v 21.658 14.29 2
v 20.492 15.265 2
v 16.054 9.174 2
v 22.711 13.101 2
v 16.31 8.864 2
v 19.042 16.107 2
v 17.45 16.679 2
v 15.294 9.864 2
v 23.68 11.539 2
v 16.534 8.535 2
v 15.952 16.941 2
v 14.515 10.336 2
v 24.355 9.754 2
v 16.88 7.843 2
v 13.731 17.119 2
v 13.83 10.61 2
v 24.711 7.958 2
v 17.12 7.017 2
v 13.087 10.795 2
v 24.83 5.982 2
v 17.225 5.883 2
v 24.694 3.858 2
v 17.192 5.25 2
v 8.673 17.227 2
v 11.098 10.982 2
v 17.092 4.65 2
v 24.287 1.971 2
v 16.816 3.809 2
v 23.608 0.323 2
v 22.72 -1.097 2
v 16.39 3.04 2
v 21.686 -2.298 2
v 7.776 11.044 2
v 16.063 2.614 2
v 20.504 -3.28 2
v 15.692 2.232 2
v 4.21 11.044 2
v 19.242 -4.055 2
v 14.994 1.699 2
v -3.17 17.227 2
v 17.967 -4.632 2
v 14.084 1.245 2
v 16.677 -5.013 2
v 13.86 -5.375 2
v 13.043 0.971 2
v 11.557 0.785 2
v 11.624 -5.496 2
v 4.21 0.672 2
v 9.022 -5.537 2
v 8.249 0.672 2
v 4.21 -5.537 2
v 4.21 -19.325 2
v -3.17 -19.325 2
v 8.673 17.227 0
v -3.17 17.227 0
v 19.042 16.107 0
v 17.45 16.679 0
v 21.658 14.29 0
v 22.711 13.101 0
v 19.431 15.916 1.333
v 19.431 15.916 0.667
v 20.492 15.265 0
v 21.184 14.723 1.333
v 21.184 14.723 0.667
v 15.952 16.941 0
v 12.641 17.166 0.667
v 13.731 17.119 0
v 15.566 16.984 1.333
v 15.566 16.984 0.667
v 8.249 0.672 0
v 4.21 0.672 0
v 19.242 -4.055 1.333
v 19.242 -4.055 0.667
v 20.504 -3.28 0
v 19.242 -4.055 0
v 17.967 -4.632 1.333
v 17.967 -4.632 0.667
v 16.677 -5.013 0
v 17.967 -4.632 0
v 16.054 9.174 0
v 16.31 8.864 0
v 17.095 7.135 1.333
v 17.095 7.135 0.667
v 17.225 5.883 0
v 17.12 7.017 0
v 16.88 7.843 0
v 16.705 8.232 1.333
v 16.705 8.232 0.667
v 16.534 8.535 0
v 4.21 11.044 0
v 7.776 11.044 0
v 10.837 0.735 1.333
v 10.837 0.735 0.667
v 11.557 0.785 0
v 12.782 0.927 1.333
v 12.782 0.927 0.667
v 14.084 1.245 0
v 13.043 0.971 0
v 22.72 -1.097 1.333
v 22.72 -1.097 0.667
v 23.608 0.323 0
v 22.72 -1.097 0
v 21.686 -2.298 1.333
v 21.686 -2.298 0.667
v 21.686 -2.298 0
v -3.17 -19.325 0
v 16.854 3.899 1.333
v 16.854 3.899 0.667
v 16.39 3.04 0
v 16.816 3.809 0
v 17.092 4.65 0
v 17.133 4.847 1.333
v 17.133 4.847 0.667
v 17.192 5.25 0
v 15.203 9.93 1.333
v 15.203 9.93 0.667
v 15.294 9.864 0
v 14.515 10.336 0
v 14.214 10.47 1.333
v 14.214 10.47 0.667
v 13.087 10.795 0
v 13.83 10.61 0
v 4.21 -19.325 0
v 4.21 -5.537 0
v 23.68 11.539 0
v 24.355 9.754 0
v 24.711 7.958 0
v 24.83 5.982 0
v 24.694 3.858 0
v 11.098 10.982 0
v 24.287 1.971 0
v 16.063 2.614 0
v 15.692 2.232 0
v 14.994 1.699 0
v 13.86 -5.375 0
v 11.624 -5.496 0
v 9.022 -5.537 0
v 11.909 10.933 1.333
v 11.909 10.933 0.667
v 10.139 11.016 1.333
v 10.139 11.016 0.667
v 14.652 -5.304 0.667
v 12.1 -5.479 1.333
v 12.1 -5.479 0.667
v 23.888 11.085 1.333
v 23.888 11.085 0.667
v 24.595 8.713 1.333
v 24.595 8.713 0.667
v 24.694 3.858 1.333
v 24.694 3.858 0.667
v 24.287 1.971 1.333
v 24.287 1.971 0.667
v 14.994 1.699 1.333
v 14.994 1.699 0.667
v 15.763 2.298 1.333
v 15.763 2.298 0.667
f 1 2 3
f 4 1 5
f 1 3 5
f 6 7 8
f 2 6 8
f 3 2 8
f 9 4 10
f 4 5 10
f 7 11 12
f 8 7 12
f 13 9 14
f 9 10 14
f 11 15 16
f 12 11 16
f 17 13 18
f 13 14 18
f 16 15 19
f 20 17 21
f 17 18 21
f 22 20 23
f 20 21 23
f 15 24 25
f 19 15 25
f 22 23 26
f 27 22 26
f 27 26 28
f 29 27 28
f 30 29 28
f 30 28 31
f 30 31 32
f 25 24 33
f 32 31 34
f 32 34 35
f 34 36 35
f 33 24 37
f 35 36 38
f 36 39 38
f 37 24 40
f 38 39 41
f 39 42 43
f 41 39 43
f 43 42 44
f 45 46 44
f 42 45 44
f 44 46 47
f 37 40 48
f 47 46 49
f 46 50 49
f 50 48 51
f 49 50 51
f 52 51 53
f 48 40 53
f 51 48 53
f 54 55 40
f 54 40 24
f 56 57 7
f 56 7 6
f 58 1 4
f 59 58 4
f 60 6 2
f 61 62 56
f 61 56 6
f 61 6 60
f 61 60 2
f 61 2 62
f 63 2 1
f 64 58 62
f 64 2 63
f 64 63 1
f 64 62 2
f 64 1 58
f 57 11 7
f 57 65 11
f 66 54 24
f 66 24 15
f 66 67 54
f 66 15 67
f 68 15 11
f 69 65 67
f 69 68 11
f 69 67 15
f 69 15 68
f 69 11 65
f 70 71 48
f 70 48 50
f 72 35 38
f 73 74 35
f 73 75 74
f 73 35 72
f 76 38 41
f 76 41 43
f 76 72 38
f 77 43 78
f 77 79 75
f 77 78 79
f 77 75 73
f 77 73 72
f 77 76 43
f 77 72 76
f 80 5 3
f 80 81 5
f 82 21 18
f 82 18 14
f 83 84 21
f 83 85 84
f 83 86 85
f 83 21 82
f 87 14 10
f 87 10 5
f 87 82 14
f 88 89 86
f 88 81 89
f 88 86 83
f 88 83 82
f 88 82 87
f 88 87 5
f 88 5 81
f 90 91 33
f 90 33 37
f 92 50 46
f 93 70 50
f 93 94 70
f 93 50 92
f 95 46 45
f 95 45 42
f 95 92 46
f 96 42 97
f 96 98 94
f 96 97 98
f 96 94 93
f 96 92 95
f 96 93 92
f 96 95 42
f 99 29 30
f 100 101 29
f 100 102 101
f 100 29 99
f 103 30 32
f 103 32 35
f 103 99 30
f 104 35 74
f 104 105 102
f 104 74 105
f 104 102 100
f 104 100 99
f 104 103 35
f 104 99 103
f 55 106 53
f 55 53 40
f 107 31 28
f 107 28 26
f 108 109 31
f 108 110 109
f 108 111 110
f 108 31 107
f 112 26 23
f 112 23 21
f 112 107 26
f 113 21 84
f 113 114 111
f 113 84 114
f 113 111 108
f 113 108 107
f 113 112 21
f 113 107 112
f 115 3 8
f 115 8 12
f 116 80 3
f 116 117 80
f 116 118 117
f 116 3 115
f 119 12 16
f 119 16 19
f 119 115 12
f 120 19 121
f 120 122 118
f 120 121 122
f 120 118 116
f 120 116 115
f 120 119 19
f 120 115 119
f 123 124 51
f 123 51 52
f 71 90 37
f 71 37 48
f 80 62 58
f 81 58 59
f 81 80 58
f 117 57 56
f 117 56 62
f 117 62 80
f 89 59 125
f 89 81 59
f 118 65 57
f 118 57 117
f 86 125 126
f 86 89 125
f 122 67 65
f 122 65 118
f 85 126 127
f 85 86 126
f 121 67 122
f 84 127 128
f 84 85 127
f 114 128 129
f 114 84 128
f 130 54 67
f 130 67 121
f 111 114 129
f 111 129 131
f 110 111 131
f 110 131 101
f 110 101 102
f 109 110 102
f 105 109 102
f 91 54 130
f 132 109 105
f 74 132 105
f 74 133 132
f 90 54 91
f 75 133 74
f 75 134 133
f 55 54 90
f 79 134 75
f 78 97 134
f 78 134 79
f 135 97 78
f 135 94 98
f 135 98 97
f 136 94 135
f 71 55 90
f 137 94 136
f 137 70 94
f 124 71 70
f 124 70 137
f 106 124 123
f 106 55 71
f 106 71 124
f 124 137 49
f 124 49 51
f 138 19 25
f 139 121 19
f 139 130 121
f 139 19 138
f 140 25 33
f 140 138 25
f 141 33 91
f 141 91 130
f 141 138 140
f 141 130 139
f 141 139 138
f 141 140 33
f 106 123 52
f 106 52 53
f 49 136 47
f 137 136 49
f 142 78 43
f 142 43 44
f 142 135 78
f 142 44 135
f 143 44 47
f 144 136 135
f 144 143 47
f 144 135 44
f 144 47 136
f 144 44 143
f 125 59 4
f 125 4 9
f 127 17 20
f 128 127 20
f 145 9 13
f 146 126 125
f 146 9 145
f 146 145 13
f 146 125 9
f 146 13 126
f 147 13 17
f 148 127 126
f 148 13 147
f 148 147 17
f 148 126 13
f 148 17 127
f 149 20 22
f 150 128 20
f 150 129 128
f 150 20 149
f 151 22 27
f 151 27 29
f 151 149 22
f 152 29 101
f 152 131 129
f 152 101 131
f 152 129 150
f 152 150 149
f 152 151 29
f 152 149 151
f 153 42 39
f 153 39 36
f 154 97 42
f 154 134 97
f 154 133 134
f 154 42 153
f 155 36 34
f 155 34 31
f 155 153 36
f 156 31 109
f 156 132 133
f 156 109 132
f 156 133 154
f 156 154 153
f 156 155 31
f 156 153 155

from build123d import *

# Parameters (mm, degrees)
EXTRUDE001_DEPTH = 2
EXTRUDE_DEPTH    = 2


with BuildPart() as extrude001:
    # path2994001 → Extrude001 (new body)
    with BuildSketch(Plane(origin=(10.717886, 5.857762, 0), x_dir=(0, 1, 0), z_dir=(0, 0, 1))):
        with BuildLine():
            add(Edge.make_bspline(
                [(5.186119, 6.507569), (-5.186099, 6.507569)],
                knots=[0, 0, 36.75195, 36.75195], degree=1))
            add(Edge.make_bspline(
                [(-5.186099, 6.507569), (-5.186099, 2.468388)],
                knots=[0, 0, 14.312057, 14.312057], degree=1))
            add(Edge.make_bspline(
                [(-5.186099, 2.468388), (-5.186119, -0.440469), (-4.994964, -2.385258), (-4.612635, -3.365984)],
                knots=[0, 0, 0, 0, 1, 1, 1, 1], degree=3))
            add(Edge.make_bspline(
                [(-4.612635, -3.365984), (-4.230346, -4.346668), (-3.63195, -5.115442), (-2.817443, -5.672306)],
                knots=[0, 0, 0, 0, 1, 1, 1, 1], degree=3))
            add(Edge.make_bspline(
                [(-2.817443, -5.672306), (-2.002981, -6.229124), (-1.05552, -6.507545), (0.024943, -6.507569)],
                knots=[0, 0, 0, 0, 1, 1, 1, 1], degree=3))
            add(Edge.make_bspline(
                [(0.024943, -6.507569), (1.354688, -6.507545), (2.451748, -6.116925), (3.316127, -5.335708)],
                knots=[0, 0, 0, 0, 1, 1, 1, 1], degree=3))
            add(Edge.make_bspline(
                [(3.316127, -5.335708), (4.18045, -4.554445), (4.720669, -3.565428), (4.936786, -2.368655)],
                knots=[0, 0, 0, 0, 1, 1, 1, 1], degree=3))
            add(Edge.make_bspline(
                [(4.936786, -2.368655), (5.102978, -1.487663), (5.186088, 0.282594), (5.186119, 2.942119)],
                knots=[0, 0, 0, 0, 1, 1, 1, 1], degree=3))
            add(Edge.make_bspline(
                [(5.186119, 2.942119), (5.186119, 6.507569)],
                knots=[0, 0, 12.633483, 12.633483], degree=1))
        make_face()
    extrude(amount=EXTRUDE001_DEPTH)


with BuildPart() as cut:
    # path2994 → Extrude (new body)
    with BuildSketch(Plane(origin=(10.830086, -1.048728, 0), x_dir=(0, -1, 0), z_dir=(0, 0, -1))):
        with BuildLine():
            add(Edge.make_bspline(
                [(18.276046, 14), (-18.276046, 14)],
                knots=[0, 0, 129.515286, 129.515286], degree=1))
            add(Edge.make_bspline(
                [(-18.276046, 14), (-18.276046, 2.156723)],
                knots=[0, 0, 41.964366, 41.964366], degree=1))
            add(Edge.make_bspline(
                [(-18.276046, 2.156723), (-18.27601, -2.331235), (-18.093166, -5.25673), (-17.727515, -6.619768)],
                knots=[0, 0, 0, 0, 1, 1, 1, 1], degree=3))
            add(Edge.make_bspline(
                [(-17.727515, -6.619768), (-17.178949, -8.714132), (-15.986312, -10.467766), (-14.149599, -11.880676)],
                knots=[0, 0, 0, 0, 1, 1, 1, 1], degree=3))
            add(Edge.make_bspline(
                [(-14.149599, -11.880676), (-12.312822, -13.293528), (-9.940013, -13.999968), (-7.031166, -14)],
                knots=[0, 0, 0, 0, 1, 1, 1, 1], degree=3))
            add(Edge.make_bspline(
                [(-7.031166, -14), (-4.787154, -13.999968), (-2.900543, -13.592726), (-1.371327, -12.778272)],
                knots=[0, 0, 0, 0, 1, 1, 1, 1], degree=3))
            add(Edge.make_bspline(
                [(-1.371327, -12.778272), (0.157928, -11.963758), (1.358877, -10.92903), (2.231523, -9.674087)],
                knots=[0, 0, 0, 0, 1, 1, 1, 1], degree=3))
            add(Edge.make_bspline(
                [(2.231523, -9.674087), (3.1042, -8.419089), (3.681819, -7.143341), (3.964381, -5.846839)],
                knots=[0, 0, 0, 0, 1, 1, 1, 1], degree=3))
            add(Edge.make_bspline(
                [(3.964381, -5.846839), (4.31346, -4.08487), (4.487992, -1.533373), (4.487978, 1.807658)],
                knots=[0, 0, 0, 0, 1, 1, 1, 1], degree=3))
            add(Edge.make_bspline(
                [(4.487978, 1.807658), (4.487978, 6.619768)],
                knots=[0, 0, 17.050785, 17.050785], degree=1))
            add(Edge.make_bspline(
                [(4.487978, 6.619768), (18.276046, 6.619768)],
                knots=[0, 0, 48.855357, 48.855357], degree=1))
            add(Edge.make_bspline(
                [(18.276046, 6.619768), (18.276046, 14)],
                knots=[0, 0, 26.150426, 26.150426], degree=1))
        make_face()
    extrude(amount=-EXTRUDE_DEPTH)

    # Cut: cut Extrude001
    add(extrude001.part, mode=Mode.SUBTRACT)


solid = cut.part
